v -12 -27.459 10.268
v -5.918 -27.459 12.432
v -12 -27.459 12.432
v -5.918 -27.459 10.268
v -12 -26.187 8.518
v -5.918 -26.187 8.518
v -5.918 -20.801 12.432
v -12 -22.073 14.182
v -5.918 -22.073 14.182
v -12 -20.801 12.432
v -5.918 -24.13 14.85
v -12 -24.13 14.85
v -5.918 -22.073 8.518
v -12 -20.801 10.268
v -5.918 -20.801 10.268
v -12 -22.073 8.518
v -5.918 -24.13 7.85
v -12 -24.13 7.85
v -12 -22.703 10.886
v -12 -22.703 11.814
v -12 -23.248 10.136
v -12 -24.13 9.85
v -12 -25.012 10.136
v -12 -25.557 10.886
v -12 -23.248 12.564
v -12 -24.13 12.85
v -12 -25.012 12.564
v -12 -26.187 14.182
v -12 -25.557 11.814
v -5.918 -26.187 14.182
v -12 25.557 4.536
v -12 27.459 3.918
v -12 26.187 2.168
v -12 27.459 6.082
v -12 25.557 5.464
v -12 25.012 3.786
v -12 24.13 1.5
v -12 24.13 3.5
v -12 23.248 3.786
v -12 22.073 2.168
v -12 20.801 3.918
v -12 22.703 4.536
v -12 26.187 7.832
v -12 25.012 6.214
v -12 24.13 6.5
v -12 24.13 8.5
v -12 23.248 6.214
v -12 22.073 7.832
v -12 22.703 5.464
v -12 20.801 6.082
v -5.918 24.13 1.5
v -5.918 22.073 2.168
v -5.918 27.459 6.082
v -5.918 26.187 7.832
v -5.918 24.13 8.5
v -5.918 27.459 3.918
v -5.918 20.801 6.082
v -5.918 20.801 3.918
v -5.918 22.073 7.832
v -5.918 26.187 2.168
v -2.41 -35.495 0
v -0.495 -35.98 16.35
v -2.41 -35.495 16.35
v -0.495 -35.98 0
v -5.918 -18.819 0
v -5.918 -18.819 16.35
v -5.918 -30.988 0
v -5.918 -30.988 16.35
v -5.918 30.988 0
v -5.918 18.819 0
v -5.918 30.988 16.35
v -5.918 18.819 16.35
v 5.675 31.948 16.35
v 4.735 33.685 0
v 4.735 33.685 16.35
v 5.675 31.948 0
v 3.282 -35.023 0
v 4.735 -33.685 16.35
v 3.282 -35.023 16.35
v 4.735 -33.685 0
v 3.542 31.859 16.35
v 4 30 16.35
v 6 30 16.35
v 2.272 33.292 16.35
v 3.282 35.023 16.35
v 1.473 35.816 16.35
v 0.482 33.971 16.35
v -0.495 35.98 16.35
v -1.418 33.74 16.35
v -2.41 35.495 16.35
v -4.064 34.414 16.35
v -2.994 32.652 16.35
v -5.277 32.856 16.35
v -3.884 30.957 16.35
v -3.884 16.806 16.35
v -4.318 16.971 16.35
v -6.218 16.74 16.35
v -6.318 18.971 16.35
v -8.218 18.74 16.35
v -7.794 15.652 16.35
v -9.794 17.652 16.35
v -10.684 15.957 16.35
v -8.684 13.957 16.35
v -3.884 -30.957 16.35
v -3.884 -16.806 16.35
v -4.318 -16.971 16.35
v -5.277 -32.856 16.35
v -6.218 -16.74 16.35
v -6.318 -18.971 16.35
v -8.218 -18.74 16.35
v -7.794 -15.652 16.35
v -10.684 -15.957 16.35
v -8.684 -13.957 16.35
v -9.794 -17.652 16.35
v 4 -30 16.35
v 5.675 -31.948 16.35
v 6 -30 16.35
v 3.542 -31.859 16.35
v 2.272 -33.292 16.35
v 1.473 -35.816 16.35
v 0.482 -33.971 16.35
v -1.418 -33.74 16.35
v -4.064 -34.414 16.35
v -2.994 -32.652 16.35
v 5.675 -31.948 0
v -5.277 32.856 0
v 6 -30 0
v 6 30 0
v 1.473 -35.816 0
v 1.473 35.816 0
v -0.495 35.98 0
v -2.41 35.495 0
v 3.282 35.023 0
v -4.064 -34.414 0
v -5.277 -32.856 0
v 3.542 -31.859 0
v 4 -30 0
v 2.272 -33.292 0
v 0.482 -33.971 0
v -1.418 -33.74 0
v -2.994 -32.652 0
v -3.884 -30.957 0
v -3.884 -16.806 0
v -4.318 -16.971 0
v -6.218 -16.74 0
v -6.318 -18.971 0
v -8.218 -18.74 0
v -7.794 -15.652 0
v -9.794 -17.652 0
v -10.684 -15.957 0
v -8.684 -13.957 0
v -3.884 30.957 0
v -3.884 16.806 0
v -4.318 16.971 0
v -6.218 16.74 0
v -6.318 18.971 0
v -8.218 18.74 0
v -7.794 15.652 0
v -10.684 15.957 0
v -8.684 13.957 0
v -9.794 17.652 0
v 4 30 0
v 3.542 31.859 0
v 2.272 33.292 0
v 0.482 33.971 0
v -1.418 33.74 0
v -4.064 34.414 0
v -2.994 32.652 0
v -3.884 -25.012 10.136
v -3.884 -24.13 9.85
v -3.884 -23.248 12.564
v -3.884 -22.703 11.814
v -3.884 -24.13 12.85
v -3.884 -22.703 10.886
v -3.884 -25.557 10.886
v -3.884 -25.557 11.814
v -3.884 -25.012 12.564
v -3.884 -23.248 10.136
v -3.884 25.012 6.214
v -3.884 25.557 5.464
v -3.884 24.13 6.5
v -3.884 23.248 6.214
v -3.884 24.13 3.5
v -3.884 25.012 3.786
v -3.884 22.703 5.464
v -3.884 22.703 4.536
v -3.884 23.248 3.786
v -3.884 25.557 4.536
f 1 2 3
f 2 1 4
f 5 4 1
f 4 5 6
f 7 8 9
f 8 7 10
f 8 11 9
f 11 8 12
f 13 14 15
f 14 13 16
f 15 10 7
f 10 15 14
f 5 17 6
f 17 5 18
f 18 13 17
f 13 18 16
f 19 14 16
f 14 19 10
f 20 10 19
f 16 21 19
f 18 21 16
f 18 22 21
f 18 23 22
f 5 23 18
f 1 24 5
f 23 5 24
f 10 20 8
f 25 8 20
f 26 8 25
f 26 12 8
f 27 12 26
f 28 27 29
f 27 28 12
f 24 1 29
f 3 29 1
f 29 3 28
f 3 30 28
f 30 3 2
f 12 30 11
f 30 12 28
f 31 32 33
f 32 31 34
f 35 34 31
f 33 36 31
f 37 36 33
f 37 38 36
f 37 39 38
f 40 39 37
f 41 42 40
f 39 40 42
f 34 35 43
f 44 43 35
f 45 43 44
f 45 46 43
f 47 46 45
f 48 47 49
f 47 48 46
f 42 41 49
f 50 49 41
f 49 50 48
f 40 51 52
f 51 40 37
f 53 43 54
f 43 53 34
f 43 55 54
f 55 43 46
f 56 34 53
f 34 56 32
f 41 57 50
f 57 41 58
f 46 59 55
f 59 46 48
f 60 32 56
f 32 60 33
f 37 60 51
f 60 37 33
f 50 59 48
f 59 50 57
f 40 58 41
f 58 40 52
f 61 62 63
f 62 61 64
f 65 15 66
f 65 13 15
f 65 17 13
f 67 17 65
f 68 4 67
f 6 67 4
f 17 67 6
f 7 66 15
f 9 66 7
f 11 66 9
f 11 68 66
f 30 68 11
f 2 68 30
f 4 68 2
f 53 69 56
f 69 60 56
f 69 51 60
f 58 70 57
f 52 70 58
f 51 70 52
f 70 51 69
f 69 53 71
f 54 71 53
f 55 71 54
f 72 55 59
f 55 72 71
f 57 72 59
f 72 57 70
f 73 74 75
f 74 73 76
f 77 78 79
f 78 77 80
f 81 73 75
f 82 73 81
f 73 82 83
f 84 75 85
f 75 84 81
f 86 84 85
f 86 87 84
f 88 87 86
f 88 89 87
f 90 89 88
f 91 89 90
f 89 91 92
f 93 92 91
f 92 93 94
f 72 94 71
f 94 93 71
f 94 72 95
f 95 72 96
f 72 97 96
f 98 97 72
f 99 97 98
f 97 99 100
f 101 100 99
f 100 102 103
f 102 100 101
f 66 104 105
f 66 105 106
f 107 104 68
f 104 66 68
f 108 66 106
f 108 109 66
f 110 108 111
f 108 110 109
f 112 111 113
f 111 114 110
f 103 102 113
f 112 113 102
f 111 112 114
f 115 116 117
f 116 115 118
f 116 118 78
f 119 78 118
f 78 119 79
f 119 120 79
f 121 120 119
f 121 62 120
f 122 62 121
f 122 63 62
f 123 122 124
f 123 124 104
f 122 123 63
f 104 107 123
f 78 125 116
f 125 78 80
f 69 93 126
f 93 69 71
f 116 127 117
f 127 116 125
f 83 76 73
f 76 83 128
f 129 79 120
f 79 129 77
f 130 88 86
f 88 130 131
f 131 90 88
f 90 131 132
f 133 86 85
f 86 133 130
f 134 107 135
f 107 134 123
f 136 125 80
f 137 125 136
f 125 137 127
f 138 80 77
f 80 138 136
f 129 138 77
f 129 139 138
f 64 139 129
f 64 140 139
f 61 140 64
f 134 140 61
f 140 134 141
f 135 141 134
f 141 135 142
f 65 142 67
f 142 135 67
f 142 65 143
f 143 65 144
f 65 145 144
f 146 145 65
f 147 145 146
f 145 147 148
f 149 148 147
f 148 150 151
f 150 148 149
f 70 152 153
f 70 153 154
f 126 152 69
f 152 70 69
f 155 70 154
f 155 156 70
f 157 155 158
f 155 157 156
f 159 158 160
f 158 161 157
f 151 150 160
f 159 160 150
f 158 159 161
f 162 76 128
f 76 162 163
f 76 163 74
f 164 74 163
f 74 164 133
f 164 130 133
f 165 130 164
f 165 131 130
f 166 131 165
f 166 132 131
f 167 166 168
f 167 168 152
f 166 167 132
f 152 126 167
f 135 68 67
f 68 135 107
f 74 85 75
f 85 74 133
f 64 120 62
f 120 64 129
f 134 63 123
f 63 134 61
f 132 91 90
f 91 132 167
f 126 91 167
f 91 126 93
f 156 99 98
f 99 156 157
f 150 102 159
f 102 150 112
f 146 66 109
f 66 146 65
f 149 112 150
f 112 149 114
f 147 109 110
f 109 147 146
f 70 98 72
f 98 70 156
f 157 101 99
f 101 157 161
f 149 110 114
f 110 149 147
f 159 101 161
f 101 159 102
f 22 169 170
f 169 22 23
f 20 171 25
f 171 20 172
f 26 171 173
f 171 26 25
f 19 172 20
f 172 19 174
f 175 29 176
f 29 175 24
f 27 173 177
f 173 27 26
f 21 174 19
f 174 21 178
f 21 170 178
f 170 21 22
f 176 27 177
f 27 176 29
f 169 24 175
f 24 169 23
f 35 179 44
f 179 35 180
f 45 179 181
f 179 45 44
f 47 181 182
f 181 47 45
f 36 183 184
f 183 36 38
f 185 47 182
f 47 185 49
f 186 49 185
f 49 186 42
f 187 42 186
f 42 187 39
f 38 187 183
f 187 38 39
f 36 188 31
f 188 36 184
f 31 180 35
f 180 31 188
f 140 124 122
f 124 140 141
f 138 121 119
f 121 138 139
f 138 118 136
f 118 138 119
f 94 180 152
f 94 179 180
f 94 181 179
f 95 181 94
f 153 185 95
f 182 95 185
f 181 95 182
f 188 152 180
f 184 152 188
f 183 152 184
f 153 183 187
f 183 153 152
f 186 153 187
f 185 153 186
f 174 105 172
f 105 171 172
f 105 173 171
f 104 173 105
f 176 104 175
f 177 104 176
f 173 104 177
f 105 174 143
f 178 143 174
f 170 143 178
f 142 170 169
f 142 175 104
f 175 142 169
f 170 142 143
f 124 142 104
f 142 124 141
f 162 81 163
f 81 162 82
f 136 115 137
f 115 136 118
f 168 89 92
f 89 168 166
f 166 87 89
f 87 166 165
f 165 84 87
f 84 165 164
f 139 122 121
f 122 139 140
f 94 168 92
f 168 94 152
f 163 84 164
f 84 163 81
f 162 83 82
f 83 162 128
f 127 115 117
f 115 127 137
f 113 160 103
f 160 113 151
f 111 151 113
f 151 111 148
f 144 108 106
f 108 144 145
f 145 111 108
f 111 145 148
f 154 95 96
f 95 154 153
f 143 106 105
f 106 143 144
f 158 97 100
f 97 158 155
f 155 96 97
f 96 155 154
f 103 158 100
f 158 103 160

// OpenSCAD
// distance between parallel rod centers
bar_distance = 60;
// parallel rods diameter
bar_diameter = 8;
// distance between belt loop 
belt_distance = 30;
// desired wall thickness
wall_thickness = 2; //[1:.25:5]
// extra height for base
base_height = 10;  //7:1:25]
// fixing bolt diameter
bolt_diameter = 3;
// horizontal distance between fixing holes in PCB (48.26 for RAMPS)
fixture_distance = 48.26;
// vertical distance between fixing holes in PCB (-1.27 and 6.35 for RAMPS top and bottom)
fixture_v_distance = 6.35;
//Dimensions taken from https://www.google.com/search?client=firefox-b-ab&biw=1440&bih=763&tbm=isch&sa=1&ei=0kxJW8HlIs62sAXto6XwAg&q=arduino+mega++mounting+dimensions&oq=arduino+mega++mounting+dimensions&gs_l=img.3...1280.2306.0.2470.8.8.0.0.0.0.122.666.6j2.8.0....0...1c.1.64.img..0.1.122...0i8i7i30k1.0.4l28b11gZ5o#imgrc=DRY_3DzLKY0mjM:

//Calculated for reuse
bar_radius = bar_diameter/2;
bolt_radius = bolt_diameter/2;
total_base_height = base_height + abs(fixture_v_distance);

difference(){
  union(){
    hull(){
      translate([0, -bar_distance/2, 0])
        cylinder(total_base_height, bar_radius+wall_thickness, bar_radius+wall_thickness);
      translate([0, bar_distance/2, 0])
        cylinder(total_base_height, bar_radius+wall_thickness, bar_radius+wall_thickness);
    }
    /* Belt saver wall */
    translate([-(1.2*bar_radius+wall_thickness), 0, 0])
    hull(){
      translate([0, -belt_distance/2, 0])
        cylinder(total_base_height, bar_radius, bar_radius);
      translate([0, belt_distance/2, 0])
        cylinder(total_base_height, bar_radius, bar_radius);
    }
    /*RAMPS fixture reinforcement*/
    translate([-bar_radius, 0, total_base_height/2])
    rotate([0,-90,0]){
      translate([fixture_v_distance/2, -fixture_distance/2, 0],  $fn=10)
        cylinder(bar_radius+2*wall_thickness, bolt_radius+wall_thickness, bolt_radius+wall_thickness, $fn=10);
      translate([-fixture_v_distance/2, fixture_distance/2, 0], $fn=10)
        cylinder(bar_radius+2*wall_thickness, bolt_radius+wall_thickness, bolt_radius+wall_thickness, $fn=10);
     }
  }
  /* Openning */
  hull(){
    translate([0, -bar_distance/2, 0])
      cylinder(total_base_height, bar_radius, bar_radius);
    translate([0, bar_distance/2, 0])
      cylinder(total_base_height, bar_radius, bar_radius);
  }
  /*Front opennig*/
  translate([bar_radius, -bar_distance/2,0])
    cube([bar_diameter, bar_distance, total_base_height]);
  
  /* Belt saver */
    translate([-1.2*bar_radius, 0, 0])
    hull(){
      translate([0, -(belt_distance/2-wall_thickness), 0])
        cylinder(total_base_height, bar_radius, bar_radius);
      translate([0, belt_distance/2-wall_thickness, 0])
        cylinder(total_base_height, bar_radius, bar_radius);
    }

  /*RAMPS fixture*/
  translate([0, 0, total_base_height/2])
  rotate([0,-90,0]){
    translate([fixture_v_distance/2, -fixture_distance/2, 0],  $fn=10)
      cylinder(2*(bar_radius+wall_thickness), bolt_radius, bolt_radius);
    translate([-fixture_v_distance/2, fixture_distance/2, 0], $fn=10)
      cylinder(2*(bar_radius+wall_thickness), bolt_radius, bolt_radius);
   }
}
